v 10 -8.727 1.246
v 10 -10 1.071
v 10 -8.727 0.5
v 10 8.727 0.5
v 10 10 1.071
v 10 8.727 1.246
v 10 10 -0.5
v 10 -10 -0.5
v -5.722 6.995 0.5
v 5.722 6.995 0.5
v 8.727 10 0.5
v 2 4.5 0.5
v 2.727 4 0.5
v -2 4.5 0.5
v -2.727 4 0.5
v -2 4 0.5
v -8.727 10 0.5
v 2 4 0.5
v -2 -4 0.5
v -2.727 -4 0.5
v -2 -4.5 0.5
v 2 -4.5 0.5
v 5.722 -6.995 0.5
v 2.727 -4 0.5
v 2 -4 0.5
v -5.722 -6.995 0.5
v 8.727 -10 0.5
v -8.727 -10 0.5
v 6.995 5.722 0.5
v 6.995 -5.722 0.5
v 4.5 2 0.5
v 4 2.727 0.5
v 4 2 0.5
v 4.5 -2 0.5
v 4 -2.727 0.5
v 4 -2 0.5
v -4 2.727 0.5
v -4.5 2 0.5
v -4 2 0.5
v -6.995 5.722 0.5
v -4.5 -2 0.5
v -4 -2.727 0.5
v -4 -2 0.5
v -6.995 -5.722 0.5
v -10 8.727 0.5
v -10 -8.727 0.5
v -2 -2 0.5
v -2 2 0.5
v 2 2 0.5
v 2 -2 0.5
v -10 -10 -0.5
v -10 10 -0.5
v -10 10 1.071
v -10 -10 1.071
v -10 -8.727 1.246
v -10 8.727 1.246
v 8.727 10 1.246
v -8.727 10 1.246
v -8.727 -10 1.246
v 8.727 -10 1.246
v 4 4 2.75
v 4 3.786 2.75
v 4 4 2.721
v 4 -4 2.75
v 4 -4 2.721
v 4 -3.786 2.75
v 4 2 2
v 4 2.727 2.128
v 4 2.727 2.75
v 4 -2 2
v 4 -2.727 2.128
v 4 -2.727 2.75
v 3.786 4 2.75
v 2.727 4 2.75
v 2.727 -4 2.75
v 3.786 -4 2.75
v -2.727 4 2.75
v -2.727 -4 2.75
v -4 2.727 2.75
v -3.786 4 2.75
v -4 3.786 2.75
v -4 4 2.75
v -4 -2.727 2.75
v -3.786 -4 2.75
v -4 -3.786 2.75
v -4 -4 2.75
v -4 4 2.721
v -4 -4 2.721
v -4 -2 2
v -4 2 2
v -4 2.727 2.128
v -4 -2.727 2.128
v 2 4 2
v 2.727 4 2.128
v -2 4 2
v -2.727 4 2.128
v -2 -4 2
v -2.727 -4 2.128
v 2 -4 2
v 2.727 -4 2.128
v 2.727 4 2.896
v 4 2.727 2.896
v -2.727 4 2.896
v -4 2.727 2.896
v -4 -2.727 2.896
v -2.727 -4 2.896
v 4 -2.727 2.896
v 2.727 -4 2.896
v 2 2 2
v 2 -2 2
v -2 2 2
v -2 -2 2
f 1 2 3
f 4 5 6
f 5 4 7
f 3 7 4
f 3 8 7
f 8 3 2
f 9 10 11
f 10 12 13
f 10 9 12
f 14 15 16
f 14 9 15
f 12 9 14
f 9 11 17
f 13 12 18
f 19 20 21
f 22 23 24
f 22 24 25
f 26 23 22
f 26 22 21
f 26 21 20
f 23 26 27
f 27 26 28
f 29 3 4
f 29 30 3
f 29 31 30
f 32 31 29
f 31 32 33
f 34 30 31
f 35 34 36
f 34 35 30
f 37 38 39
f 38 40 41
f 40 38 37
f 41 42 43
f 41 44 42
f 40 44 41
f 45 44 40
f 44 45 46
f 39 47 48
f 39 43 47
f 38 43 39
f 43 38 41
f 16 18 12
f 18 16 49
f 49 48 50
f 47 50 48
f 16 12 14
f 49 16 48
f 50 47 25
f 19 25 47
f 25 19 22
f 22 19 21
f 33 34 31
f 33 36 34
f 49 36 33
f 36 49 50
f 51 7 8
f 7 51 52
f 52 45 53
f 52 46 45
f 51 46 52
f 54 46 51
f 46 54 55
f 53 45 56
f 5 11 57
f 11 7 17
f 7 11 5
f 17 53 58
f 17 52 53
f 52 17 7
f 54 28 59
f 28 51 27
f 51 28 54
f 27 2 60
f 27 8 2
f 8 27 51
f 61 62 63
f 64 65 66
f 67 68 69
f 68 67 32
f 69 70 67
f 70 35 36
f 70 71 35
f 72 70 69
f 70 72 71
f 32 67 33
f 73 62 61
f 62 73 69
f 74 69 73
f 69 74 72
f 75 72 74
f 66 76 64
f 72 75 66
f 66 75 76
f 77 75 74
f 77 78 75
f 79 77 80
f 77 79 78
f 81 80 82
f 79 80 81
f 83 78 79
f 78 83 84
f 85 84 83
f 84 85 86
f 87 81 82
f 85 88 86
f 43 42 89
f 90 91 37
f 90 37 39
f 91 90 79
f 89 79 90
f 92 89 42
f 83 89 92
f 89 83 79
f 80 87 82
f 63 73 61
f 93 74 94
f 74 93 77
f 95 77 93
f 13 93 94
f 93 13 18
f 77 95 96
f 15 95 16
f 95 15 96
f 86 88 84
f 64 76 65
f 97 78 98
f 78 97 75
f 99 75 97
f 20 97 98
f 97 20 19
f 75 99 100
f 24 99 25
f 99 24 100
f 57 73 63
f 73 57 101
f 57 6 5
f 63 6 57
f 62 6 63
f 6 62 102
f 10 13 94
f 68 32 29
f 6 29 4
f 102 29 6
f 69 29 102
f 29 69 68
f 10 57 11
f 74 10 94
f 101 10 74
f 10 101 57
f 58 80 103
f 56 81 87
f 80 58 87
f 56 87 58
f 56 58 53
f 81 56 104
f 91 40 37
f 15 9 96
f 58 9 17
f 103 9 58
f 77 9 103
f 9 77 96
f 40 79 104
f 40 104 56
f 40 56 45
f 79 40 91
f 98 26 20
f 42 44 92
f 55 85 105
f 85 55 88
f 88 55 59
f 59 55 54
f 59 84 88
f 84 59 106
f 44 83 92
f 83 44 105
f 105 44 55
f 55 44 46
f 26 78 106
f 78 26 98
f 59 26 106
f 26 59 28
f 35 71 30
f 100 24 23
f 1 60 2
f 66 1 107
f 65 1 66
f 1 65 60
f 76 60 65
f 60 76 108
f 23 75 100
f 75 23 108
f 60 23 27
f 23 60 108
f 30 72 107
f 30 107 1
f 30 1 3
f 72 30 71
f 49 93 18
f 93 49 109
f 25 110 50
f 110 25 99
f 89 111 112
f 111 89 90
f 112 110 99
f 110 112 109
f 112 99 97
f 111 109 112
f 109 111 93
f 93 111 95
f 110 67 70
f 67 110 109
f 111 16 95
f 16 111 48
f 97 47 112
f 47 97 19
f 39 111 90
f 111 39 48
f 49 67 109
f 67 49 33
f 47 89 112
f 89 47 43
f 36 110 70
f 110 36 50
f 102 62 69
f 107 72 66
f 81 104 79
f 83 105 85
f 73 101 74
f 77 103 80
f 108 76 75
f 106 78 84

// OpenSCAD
/*

Zip Tie Anchor by
[PeterEllens](https://www.thingiverse.com/thing:24187)
is licensed under a [CC-BY license](https://creativecommons.org/licenses/by/4.0/)

Modified by [Gerrit Niezen](https://github.com/OpenAirMonitor/OpenAirMonitor/tree/main/enclosure)

*/

module zip_tie_anchor() {
    base_width = 20;
    base_height = 1;
    gap_width = 4;
    gap_height = 1.5;
    top_width = 8;
    top_height = 1.5;
    cross_width = 1.8;

    diaginal_width = sqrt(base_width*base_width+base_width*base_width);

    difference () {
    union() {
    cube(size=[base_width,base_width,base_height],center=true);
    translate(v=[0,0,base_height+(gap_height-base_height)/2]) cube(size=[top_width,top_width,top_height+gap_height],center=true);

    rotate(a=[0,11,45]) translate(v=[diaginal_width/4,0,base_height+gap_height]) cube(size=[diaginal_width/2,cross_width,gap_height+1],center=true);

    rotate(a=[0,11,90+45]) translate(v=[diaginal_width/4,0,base_height+gap_height]) cube(size=[diaginal_width/2,cross_width,gap_height+1],center=true);

    rotate(a=[0,11,180+45]) translate(v=[diaginal_width/4,0,base_height+gap_height]) cube(size=[diaginal_width/2,cross_width,gap_height+1],center=true);

    rotate(a=[0,11,270+45]) translate(v=[diaginal_width/4,0,base_height+gap_height]) cube(size=[diaginal_width/2,cross_width,gap_height+1],center=true);


    }
    translate(v=[0,0,base_height+(gap_height-base_height)/2]) cube(size=[gap_width,top_width+1,gap_height],center=true);
    translate(v=[0,0,base_height+(gap_height-base_height)/2]) cube(size=[top_width+1,gap_width,gap_height],center=true);

    translate(v=[0,0,base_height+(gap_height+base_height)]) cube(size=[top_width,top_width,top_height],center=true);

    translate(v=[0,0,-base_height-(base_height)/2]) cube(size=[base_width+2,base_width+2,base_height*2],center=true);

    translate(v=[0,base_width,0]) cube(size=[base_width+5,base_width,base_height+2],center=true);

    translate(v=[0,-base_width,0]) cube(size=[base_width+5,base_width,base_height+2],center=true);

    translate(v=[base_width,0,0]) cube(size=[base_width,base_width+5,base_height+2],center=true);

    translate(v=[-base_width,0,0]) cube(size=[base_width,base_width+5,base_height+2],center=true);

    }
}

zip_tie_anchor();
